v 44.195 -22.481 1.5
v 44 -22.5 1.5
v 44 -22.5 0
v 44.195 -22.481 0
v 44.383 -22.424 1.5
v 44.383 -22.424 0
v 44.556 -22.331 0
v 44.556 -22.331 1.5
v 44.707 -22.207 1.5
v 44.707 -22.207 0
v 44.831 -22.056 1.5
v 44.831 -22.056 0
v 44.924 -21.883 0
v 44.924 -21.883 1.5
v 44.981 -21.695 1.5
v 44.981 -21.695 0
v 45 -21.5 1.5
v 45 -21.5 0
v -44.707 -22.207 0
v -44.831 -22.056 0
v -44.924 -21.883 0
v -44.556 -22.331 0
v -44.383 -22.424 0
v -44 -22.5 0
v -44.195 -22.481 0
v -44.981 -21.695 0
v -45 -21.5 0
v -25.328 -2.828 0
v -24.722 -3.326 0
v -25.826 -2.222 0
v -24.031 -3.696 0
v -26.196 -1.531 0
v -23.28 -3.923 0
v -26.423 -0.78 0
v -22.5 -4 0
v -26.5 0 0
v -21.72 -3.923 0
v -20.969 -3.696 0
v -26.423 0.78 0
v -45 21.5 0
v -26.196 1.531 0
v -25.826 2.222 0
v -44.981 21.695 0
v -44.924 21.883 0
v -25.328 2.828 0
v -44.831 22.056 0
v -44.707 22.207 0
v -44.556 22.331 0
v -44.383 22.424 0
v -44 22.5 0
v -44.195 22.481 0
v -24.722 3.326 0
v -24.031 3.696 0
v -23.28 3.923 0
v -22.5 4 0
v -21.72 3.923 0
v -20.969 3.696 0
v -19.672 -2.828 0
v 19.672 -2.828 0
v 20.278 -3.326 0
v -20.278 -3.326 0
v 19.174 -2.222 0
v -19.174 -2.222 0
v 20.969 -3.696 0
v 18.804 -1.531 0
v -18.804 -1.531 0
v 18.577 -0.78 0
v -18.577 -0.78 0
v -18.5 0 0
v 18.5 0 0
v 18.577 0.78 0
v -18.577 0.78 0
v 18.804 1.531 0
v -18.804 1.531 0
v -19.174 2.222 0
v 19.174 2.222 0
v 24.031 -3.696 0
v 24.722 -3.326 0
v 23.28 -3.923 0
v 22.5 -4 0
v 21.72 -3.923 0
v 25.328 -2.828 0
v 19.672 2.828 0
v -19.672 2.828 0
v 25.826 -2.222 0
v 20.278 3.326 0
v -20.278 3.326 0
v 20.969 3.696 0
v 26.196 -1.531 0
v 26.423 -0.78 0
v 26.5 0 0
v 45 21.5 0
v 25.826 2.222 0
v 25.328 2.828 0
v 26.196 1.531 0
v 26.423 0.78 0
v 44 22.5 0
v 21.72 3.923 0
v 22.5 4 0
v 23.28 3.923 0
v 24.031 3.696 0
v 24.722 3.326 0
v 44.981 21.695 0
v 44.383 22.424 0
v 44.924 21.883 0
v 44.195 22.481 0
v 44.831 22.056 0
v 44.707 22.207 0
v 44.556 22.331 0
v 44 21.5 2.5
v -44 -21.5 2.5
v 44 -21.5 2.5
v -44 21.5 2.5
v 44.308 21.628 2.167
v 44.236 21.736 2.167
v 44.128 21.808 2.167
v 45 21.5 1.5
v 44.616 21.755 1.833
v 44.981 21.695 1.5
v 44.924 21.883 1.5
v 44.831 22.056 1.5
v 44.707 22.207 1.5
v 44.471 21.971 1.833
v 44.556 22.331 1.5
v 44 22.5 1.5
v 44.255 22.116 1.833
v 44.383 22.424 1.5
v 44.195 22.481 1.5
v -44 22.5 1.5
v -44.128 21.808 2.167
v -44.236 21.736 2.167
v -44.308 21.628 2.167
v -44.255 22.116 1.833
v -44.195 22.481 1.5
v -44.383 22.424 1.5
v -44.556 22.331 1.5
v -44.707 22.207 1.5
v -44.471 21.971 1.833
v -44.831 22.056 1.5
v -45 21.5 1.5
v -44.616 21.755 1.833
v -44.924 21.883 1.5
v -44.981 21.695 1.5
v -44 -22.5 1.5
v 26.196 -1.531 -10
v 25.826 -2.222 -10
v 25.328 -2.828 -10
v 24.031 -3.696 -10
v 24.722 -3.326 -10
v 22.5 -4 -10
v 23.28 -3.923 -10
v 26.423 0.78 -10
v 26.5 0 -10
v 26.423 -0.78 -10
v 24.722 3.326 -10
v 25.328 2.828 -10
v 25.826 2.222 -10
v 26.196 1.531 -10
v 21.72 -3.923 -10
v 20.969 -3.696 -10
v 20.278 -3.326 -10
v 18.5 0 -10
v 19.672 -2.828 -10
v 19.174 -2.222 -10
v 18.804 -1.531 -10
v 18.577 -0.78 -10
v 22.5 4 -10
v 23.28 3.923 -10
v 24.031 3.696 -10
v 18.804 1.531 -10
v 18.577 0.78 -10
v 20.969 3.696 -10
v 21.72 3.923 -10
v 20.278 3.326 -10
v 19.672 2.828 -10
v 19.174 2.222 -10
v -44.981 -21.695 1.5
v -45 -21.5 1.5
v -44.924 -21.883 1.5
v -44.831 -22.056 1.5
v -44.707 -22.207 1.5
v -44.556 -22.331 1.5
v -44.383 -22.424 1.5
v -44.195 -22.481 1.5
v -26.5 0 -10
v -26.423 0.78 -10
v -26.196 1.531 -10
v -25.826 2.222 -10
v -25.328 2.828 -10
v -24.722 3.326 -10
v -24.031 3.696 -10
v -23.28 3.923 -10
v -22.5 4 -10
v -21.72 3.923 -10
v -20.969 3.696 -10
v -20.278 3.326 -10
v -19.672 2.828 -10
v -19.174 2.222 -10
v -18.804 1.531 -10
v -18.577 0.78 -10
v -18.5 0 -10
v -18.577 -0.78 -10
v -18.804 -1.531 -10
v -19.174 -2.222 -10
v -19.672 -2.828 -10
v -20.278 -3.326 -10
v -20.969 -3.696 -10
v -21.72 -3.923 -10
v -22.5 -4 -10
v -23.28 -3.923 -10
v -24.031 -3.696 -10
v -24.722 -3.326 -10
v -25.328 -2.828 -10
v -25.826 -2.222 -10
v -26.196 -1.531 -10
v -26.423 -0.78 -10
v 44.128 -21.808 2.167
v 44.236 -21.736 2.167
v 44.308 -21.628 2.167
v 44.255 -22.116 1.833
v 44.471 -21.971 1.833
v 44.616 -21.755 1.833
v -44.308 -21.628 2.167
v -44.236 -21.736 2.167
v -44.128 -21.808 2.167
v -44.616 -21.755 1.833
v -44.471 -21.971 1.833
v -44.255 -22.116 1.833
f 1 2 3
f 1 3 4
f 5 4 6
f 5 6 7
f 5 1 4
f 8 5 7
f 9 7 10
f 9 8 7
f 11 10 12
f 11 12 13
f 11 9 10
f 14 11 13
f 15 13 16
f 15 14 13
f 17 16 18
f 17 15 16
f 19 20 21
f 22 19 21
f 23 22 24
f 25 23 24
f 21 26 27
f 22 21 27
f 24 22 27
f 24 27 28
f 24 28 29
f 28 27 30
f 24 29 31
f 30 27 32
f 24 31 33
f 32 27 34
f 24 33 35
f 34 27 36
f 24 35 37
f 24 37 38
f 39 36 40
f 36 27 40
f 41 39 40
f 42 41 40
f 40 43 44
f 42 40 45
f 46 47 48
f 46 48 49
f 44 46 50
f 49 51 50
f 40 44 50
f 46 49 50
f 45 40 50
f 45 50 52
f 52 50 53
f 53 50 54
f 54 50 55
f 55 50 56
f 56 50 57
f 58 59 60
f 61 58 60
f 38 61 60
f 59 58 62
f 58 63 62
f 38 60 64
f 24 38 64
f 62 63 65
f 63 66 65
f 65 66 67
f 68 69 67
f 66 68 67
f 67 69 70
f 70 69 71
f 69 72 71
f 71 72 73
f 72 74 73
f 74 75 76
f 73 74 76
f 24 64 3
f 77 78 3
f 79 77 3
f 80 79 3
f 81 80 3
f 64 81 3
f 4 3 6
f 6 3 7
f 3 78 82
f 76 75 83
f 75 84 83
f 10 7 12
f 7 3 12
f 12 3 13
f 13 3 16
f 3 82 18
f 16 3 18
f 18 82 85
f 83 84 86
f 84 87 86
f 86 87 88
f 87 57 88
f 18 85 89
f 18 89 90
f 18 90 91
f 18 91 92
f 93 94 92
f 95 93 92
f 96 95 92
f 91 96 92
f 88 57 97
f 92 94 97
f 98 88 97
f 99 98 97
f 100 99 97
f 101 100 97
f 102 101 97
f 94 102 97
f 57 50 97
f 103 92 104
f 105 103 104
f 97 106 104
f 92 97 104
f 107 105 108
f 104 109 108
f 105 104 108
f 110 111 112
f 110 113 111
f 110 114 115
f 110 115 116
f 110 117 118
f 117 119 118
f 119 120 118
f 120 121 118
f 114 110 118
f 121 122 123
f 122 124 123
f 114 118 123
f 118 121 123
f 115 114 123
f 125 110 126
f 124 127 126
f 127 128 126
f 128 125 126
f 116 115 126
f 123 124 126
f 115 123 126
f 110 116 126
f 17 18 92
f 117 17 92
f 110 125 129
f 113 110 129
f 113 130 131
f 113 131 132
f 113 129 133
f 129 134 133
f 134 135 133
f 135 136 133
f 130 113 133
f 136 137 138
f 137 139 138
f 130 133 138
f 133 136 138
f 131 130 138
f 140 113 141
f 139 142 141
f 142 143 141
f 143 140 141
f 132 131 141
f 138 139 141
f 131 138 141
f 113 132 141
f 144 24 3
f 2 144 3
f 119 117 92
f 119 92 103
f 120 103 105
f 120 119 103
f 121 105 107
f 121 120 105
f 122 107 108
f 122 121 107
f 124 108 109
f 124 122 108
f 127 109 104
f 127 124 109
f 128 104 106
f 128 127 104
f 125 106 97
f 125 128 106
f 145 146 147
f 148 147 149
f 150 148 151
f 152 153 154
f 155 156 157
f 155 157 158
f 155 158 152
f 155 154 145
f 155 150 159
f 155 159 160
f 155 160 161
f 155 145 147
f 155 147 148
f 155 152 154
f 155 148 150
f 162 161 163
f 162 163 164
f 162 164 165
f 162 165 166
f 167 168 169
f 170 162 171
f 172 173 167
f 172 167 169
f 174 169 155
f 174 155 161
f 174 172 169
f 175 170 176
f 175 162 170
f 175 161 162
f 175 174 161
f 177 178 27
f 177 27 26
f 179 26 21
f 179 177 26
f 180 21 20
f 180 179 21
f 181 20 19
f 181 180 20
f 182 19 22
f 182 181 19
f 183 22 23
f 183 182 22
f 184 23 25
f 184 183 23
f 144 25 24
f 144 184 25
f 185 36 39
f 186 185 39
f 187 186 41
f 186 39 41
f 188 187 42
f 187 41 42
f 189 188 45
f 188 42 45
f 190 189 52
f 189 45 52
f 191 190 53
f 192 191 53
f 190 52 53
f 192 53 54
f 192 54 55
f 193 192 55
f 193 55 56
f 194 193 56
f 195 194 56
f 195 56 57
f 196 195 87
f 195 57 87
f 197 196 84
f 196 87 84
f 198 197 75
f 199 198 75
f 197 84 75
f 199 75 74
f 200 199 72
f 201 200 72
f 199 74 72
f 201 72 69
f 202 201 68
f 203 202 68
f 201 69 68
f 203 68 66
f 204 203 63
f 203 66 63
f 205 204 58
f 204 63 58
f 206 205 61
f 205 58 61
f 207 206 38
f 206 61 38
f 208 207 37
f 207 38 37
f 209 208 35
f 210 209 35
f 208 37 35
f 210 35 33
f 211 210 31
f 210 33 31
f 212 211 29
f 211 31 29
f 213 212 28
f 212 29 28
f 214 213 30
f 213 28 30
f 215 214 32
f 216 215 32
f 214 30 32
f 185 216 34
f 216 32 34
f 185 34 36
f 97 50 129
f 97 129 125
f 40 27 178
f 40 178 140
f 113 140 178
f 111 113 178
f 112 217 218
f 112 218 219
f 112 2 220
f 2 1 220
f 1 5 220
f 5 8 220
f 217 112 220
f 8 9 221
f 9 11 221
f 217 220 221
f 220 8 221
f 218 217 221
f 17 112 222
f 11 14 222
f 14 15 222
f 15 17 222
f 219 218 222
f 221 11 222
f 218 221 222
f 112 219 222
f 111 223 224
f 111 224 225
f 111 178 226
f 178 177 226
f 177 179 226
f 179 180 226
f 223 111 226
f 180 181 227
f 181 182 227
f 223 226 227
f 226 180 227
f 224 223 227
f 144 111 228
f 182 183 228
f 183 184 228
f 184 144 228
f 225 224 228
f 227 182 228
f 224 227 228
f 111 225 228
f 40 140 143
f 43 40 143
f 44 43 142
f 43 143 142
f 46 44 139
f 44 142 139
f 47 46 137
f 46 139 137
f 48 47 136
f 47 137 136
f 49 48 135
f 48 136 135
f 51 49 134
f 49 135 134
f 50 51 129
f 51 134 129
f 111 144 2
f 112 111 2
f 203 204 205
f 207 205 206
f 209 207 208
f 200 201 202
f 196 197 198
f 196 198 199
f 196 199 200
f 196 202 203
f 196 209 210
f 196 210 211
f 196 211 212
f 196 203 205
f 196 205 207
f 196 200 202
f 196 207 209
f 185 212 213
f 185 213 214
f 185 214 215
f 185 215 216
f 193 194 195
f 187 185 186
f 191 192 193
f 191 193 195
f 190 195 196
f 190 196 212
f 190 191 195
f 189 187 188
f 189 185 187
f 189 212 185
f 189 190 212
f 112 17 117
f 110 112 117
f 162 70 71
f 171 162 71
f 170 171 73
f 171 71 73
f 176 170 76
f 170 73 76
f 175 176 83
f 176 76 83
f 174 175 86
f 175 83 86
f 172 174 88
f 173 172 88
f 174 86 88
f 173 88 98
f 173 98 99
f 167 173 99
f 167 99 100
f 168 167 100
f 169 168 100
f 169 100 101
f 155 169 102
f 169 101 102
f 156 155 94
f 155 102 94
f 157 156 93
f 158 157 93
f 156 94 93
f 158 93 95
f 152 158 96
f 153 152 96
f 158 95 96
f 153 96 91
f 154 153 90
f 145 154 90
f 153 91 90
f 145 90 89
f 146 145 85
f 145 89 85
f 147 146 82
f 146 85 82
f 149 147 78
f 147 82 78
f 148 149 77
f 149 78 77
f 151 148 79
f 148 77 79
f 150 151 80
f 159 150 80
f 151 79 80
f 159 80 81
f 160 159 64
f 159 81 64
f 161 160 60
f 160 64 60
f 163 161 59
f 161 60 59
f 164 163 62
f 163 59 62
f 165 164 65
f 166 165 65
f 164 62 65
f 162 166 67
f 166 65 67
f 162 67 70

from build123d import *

# Parameters (mm, degrees)
SKETCH1_W           = 90
SKETCH1_H           = 45
BOSS_EXTRUDE1_DEPTH = 2.5
FILLET1_R           = 1
CHAMFER1_SIZE       = 1
SKETCH2_R           = 4
BOSS_EXTRUDE2_DEPTH = 10


with BuildPart() as part:
    # Sketch1 → Boss-Extrude1 (new body)
    with BuildSketch(Plane.XY):
        Rectangle(SKETCH1_W, SKETCH1_H)
    extrude(amount=BOSS_EXTRUDE1_DEPTH)

    # Fillet1
    fillet1_edges = [part.edges().sort_by_distance(p)[0] for p in [
        (45, -22.5, 1.25),
        (-45, -22.5, 1.25),
        (-45, 22.5, 1.25),
        (45, 22.5, 1.25),
    ]]
    fillet(fillet1_edges, radius=FILLET1_R)

    # Chamfer1
    chamfer1_edges = [part.edges().sort_by_distance(p)[0] for p in [
        (0, -22.5, 2.5),
        (-45, 0, 2.5),
        (45, 0, 2.5),
        (0, 22.5, 2.5),
        (44.707106781, -22.207106781, 2.5),
        (44.707106781, 22.207106781, 2.5),
        (-44.707106781, 22.207106781, 2.5),
        (-44.707106781, -22.207106781, 2.5),
    ]]
    chamfer(chamfer1_edges, length=CHAMFER1_SIZE)

    # Sketch2 → Boss-Extrude2 (add)
    with BuildSketch(Plane(origin=(0, 0, 0), x_dir=(-1, 0, 0), z_dir=(0, 0, -1))):
        with Locations((-22.5, 0)):
            Circle(SKETCH2_R)
        with Locations((22.5, 0)):
            Circle(SKETCH2_R)
    extrude(amount=BOSS_EXTRUDE2_DEPTH)


solid = part.part
